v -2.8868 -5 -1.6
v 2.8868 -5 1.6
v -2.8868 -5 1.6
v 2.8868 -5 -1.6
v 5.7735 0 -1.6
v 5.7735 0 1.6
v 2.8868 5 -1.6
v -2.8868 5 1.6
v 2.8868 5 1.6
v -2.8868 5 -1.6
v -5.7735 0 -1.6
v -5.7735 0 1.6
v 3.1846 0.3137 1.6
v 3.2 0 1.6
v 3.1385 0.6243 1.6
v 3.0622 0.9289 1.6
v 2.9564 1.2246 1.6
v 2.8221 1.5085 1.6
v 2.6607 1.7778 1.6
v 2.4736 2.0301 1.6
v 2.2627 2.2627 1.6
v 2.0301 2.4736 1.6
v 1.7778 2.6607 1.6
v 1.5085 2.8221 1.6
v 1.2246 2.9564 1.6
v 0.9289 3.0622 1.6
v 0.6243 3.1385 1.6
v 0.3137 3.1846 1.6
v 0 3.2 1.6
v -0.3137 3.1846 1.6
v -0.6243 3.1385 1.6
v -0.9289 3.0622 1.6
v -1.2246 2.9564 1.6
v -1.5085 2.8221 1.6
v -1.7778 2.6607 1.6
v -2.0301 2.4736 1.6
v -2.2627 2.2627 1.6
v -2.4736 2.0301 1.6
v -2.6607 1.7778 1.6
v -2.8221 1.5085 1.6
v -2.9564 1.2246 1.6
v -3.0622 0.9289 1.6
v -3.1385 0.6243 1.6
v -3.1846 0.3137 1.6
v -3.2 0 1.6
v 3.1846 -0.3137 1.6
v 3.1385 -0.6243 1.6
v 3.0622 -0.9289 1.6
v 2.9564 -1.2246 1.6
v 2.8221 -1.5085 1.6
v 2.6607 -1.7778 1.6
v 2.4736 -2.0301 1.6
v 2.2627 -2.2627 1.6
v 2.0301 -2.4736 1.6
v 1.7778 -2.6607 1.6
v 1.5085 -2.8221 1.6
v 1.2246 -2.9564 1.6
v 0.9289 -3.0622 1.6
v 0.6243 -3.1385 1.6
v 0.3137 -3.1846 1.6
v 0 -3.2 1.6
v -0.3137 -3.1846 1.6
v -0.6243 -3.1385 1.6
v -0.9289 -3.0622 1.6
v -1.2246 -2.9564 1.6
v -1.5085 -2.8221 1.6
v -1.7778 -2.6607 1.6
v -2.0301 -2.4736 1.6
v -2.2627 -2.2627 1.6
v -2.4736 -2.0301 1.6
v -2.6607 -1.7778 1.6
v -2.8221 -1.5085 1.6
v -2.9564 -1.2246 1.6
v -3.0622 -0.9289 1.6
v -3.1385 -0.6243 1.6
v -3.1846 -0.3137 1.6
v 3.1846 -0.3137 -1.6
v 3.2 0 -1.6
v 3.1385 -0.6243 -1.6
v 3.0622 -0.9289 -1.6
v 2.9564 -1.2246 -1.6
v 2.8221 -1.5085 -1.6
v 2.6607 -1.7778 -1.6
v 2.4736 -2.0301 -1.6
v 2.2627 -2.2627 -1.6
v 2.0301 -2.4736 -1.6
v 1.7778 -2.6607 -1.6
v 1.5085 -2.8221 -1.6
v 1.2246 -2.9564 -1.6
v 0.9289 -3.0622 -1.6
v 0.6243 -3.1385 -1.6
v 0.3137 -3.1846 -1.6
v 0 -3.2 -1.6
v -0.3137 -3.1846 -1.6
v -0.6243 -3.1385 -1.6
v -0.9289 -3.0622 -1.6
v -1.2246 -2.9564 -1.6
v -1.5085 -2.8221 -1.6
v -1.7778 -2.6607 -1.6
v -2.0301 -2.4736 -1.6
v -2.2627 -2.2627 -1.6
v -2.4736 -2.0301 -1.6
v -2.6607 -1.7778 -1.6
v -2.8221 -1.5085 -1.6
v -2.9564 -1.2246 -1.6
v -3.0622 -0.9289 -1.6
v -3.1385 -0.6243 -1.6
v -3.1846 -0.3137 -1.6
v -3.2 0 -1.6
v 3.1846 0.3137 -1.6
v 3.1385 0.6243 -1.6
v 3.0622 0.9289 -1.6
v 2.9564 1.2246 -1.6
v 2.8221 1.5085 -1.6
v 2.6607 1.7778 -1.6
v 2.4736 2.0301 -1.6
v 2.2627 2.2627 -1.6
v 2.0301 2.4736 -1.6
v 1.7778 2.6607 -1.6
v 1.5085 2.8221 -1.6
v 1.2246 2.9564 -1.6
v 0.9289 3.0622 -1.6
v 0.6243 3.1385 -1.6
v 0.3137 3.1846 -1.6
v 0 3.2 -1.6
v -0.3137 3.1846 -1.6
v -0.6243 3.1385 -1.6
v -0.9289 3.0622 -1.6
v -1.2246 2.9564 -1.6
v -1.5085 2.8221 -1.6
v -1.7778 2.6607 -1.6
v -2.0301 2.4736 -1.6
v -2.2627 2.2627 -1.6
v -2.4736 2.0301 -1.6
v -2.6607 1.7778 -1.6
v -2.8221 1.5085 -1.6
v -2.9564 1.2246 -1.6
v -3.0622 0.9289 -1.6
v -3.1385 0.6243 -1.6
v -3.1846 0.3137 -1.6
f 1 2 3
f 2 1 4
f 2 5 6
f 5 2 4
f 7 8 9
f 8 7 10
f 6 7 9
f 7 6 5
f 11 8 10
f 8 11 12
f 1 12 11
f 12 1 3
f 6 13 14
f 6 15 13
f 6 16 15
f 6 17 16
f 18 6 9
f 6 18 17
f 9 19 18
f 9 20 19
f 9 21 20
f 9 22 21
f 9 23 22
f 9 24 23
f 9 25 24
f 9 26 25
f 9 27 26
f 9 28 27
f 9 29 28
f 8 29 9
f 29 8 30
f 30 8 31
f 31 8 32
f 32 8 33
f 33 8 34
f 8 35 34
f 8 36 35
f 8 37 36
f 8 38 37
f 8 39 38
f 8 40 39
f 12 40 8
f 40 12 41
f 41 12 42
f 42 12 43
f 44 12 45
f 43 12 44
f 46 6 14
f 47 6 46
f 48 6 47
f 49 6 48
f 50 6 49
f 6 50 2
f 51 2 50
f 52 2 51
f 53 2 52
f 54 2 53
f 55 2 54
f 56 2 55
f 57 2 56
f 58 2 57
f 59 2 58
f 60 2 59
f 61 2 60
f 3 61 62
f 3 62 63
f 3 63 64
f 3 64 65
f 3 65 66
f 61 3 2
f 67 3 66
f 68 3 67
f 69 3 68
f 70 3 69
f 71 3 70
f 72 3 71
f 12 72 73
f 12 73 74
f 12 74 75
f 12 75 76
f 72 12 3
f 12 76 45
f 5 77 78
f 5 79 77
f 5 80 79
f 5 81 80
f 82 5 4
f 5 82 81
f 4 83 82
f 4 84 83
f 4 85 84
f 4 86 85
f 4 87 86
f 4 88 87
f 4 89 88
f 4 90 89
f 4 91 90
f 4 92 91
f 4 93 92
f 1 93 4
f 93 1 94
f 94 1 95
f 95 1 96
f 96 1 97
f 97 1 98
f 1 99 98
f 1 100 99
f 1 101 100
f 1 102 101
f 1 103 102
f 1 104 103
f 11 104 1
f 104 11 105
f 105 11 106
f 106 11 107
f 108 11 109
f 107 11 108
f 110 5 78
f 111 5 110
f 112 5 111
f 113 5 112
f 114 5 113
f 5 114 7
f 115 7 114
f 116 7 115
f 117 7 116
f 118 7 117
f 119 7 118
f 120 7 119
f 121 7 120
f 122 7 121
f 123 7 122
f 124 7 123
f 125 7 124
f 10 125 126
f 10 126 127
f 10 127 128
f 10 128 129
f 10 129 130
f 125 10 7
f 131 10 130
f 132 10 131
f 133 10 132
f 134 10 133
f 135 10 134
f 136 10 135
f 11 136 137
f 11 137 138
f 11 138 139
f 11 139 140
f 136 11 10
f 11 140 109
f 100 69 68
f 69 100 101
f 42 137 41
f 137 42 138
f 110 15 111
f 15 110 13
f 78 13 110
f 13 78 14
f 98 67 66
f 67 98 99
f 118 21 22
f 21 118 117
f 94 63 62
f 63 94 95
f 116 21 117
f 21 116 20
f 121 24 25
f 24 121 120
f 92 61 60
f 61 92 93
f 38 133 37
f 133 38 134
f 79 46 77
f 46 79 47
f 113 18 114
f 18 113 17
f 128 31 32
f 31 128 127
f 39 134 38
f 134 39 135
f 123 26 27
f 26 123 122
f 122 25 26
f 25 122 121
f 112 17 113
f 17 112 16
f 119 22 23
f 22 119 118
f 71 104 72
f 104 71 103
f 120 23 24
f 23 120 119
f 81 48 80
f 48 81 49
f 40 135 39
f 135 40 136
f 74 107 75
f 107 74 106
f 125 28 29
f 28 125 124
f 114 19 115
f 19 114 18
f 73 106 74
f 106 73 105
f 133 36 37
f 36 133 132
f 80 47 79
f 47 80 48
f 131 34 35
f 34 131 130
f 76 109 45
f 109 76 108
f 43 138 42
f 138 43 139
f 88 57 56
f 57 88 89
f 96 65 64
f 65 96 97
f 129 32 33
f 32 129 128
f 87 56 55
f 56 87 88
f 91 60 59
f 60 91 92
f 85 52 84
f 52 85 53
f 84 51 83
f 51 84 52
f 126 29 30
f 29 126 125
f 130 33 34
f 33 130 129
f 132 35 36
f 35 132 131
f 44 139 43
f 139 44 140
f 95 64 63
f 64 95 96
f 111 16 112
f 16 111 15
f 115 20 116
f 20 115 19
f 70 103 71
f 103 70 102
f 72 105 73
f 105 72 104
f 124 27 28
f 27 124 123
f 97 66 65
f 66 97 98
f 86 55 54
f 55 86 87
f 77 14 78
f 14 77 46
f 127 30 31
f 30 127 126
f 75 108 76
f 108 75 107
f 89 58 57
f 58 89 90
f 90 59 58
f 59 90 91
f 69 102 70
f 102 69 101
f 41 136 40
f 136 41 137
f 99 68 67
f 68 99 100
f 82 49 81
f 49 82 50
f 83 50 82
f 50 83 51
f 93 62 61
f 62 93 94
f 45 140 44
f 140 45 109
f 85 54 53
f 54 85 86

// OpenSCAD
$fn=64;

module hex_prism_across_flats(af=10.0, h=3.2){
    r = af / sqrt(3); // circumradius for given across-flats
    cylinder(h=h, r=r, center=true, $fn=6);
}

module nut(m_thread=6.0, af=10.0, thickness=3.2, hole_clearance=0.4){
    difference(){
        hex_prism_across_flats(af=af, h=thickness);
        cylinder(h=thickness+0.6, d=m_thread+hole_clearance, center=true, $fn=64);
    }
}

nut(m_thread=6.0, af=10.0, thickness=3.2, hole_clearance=0.4);
